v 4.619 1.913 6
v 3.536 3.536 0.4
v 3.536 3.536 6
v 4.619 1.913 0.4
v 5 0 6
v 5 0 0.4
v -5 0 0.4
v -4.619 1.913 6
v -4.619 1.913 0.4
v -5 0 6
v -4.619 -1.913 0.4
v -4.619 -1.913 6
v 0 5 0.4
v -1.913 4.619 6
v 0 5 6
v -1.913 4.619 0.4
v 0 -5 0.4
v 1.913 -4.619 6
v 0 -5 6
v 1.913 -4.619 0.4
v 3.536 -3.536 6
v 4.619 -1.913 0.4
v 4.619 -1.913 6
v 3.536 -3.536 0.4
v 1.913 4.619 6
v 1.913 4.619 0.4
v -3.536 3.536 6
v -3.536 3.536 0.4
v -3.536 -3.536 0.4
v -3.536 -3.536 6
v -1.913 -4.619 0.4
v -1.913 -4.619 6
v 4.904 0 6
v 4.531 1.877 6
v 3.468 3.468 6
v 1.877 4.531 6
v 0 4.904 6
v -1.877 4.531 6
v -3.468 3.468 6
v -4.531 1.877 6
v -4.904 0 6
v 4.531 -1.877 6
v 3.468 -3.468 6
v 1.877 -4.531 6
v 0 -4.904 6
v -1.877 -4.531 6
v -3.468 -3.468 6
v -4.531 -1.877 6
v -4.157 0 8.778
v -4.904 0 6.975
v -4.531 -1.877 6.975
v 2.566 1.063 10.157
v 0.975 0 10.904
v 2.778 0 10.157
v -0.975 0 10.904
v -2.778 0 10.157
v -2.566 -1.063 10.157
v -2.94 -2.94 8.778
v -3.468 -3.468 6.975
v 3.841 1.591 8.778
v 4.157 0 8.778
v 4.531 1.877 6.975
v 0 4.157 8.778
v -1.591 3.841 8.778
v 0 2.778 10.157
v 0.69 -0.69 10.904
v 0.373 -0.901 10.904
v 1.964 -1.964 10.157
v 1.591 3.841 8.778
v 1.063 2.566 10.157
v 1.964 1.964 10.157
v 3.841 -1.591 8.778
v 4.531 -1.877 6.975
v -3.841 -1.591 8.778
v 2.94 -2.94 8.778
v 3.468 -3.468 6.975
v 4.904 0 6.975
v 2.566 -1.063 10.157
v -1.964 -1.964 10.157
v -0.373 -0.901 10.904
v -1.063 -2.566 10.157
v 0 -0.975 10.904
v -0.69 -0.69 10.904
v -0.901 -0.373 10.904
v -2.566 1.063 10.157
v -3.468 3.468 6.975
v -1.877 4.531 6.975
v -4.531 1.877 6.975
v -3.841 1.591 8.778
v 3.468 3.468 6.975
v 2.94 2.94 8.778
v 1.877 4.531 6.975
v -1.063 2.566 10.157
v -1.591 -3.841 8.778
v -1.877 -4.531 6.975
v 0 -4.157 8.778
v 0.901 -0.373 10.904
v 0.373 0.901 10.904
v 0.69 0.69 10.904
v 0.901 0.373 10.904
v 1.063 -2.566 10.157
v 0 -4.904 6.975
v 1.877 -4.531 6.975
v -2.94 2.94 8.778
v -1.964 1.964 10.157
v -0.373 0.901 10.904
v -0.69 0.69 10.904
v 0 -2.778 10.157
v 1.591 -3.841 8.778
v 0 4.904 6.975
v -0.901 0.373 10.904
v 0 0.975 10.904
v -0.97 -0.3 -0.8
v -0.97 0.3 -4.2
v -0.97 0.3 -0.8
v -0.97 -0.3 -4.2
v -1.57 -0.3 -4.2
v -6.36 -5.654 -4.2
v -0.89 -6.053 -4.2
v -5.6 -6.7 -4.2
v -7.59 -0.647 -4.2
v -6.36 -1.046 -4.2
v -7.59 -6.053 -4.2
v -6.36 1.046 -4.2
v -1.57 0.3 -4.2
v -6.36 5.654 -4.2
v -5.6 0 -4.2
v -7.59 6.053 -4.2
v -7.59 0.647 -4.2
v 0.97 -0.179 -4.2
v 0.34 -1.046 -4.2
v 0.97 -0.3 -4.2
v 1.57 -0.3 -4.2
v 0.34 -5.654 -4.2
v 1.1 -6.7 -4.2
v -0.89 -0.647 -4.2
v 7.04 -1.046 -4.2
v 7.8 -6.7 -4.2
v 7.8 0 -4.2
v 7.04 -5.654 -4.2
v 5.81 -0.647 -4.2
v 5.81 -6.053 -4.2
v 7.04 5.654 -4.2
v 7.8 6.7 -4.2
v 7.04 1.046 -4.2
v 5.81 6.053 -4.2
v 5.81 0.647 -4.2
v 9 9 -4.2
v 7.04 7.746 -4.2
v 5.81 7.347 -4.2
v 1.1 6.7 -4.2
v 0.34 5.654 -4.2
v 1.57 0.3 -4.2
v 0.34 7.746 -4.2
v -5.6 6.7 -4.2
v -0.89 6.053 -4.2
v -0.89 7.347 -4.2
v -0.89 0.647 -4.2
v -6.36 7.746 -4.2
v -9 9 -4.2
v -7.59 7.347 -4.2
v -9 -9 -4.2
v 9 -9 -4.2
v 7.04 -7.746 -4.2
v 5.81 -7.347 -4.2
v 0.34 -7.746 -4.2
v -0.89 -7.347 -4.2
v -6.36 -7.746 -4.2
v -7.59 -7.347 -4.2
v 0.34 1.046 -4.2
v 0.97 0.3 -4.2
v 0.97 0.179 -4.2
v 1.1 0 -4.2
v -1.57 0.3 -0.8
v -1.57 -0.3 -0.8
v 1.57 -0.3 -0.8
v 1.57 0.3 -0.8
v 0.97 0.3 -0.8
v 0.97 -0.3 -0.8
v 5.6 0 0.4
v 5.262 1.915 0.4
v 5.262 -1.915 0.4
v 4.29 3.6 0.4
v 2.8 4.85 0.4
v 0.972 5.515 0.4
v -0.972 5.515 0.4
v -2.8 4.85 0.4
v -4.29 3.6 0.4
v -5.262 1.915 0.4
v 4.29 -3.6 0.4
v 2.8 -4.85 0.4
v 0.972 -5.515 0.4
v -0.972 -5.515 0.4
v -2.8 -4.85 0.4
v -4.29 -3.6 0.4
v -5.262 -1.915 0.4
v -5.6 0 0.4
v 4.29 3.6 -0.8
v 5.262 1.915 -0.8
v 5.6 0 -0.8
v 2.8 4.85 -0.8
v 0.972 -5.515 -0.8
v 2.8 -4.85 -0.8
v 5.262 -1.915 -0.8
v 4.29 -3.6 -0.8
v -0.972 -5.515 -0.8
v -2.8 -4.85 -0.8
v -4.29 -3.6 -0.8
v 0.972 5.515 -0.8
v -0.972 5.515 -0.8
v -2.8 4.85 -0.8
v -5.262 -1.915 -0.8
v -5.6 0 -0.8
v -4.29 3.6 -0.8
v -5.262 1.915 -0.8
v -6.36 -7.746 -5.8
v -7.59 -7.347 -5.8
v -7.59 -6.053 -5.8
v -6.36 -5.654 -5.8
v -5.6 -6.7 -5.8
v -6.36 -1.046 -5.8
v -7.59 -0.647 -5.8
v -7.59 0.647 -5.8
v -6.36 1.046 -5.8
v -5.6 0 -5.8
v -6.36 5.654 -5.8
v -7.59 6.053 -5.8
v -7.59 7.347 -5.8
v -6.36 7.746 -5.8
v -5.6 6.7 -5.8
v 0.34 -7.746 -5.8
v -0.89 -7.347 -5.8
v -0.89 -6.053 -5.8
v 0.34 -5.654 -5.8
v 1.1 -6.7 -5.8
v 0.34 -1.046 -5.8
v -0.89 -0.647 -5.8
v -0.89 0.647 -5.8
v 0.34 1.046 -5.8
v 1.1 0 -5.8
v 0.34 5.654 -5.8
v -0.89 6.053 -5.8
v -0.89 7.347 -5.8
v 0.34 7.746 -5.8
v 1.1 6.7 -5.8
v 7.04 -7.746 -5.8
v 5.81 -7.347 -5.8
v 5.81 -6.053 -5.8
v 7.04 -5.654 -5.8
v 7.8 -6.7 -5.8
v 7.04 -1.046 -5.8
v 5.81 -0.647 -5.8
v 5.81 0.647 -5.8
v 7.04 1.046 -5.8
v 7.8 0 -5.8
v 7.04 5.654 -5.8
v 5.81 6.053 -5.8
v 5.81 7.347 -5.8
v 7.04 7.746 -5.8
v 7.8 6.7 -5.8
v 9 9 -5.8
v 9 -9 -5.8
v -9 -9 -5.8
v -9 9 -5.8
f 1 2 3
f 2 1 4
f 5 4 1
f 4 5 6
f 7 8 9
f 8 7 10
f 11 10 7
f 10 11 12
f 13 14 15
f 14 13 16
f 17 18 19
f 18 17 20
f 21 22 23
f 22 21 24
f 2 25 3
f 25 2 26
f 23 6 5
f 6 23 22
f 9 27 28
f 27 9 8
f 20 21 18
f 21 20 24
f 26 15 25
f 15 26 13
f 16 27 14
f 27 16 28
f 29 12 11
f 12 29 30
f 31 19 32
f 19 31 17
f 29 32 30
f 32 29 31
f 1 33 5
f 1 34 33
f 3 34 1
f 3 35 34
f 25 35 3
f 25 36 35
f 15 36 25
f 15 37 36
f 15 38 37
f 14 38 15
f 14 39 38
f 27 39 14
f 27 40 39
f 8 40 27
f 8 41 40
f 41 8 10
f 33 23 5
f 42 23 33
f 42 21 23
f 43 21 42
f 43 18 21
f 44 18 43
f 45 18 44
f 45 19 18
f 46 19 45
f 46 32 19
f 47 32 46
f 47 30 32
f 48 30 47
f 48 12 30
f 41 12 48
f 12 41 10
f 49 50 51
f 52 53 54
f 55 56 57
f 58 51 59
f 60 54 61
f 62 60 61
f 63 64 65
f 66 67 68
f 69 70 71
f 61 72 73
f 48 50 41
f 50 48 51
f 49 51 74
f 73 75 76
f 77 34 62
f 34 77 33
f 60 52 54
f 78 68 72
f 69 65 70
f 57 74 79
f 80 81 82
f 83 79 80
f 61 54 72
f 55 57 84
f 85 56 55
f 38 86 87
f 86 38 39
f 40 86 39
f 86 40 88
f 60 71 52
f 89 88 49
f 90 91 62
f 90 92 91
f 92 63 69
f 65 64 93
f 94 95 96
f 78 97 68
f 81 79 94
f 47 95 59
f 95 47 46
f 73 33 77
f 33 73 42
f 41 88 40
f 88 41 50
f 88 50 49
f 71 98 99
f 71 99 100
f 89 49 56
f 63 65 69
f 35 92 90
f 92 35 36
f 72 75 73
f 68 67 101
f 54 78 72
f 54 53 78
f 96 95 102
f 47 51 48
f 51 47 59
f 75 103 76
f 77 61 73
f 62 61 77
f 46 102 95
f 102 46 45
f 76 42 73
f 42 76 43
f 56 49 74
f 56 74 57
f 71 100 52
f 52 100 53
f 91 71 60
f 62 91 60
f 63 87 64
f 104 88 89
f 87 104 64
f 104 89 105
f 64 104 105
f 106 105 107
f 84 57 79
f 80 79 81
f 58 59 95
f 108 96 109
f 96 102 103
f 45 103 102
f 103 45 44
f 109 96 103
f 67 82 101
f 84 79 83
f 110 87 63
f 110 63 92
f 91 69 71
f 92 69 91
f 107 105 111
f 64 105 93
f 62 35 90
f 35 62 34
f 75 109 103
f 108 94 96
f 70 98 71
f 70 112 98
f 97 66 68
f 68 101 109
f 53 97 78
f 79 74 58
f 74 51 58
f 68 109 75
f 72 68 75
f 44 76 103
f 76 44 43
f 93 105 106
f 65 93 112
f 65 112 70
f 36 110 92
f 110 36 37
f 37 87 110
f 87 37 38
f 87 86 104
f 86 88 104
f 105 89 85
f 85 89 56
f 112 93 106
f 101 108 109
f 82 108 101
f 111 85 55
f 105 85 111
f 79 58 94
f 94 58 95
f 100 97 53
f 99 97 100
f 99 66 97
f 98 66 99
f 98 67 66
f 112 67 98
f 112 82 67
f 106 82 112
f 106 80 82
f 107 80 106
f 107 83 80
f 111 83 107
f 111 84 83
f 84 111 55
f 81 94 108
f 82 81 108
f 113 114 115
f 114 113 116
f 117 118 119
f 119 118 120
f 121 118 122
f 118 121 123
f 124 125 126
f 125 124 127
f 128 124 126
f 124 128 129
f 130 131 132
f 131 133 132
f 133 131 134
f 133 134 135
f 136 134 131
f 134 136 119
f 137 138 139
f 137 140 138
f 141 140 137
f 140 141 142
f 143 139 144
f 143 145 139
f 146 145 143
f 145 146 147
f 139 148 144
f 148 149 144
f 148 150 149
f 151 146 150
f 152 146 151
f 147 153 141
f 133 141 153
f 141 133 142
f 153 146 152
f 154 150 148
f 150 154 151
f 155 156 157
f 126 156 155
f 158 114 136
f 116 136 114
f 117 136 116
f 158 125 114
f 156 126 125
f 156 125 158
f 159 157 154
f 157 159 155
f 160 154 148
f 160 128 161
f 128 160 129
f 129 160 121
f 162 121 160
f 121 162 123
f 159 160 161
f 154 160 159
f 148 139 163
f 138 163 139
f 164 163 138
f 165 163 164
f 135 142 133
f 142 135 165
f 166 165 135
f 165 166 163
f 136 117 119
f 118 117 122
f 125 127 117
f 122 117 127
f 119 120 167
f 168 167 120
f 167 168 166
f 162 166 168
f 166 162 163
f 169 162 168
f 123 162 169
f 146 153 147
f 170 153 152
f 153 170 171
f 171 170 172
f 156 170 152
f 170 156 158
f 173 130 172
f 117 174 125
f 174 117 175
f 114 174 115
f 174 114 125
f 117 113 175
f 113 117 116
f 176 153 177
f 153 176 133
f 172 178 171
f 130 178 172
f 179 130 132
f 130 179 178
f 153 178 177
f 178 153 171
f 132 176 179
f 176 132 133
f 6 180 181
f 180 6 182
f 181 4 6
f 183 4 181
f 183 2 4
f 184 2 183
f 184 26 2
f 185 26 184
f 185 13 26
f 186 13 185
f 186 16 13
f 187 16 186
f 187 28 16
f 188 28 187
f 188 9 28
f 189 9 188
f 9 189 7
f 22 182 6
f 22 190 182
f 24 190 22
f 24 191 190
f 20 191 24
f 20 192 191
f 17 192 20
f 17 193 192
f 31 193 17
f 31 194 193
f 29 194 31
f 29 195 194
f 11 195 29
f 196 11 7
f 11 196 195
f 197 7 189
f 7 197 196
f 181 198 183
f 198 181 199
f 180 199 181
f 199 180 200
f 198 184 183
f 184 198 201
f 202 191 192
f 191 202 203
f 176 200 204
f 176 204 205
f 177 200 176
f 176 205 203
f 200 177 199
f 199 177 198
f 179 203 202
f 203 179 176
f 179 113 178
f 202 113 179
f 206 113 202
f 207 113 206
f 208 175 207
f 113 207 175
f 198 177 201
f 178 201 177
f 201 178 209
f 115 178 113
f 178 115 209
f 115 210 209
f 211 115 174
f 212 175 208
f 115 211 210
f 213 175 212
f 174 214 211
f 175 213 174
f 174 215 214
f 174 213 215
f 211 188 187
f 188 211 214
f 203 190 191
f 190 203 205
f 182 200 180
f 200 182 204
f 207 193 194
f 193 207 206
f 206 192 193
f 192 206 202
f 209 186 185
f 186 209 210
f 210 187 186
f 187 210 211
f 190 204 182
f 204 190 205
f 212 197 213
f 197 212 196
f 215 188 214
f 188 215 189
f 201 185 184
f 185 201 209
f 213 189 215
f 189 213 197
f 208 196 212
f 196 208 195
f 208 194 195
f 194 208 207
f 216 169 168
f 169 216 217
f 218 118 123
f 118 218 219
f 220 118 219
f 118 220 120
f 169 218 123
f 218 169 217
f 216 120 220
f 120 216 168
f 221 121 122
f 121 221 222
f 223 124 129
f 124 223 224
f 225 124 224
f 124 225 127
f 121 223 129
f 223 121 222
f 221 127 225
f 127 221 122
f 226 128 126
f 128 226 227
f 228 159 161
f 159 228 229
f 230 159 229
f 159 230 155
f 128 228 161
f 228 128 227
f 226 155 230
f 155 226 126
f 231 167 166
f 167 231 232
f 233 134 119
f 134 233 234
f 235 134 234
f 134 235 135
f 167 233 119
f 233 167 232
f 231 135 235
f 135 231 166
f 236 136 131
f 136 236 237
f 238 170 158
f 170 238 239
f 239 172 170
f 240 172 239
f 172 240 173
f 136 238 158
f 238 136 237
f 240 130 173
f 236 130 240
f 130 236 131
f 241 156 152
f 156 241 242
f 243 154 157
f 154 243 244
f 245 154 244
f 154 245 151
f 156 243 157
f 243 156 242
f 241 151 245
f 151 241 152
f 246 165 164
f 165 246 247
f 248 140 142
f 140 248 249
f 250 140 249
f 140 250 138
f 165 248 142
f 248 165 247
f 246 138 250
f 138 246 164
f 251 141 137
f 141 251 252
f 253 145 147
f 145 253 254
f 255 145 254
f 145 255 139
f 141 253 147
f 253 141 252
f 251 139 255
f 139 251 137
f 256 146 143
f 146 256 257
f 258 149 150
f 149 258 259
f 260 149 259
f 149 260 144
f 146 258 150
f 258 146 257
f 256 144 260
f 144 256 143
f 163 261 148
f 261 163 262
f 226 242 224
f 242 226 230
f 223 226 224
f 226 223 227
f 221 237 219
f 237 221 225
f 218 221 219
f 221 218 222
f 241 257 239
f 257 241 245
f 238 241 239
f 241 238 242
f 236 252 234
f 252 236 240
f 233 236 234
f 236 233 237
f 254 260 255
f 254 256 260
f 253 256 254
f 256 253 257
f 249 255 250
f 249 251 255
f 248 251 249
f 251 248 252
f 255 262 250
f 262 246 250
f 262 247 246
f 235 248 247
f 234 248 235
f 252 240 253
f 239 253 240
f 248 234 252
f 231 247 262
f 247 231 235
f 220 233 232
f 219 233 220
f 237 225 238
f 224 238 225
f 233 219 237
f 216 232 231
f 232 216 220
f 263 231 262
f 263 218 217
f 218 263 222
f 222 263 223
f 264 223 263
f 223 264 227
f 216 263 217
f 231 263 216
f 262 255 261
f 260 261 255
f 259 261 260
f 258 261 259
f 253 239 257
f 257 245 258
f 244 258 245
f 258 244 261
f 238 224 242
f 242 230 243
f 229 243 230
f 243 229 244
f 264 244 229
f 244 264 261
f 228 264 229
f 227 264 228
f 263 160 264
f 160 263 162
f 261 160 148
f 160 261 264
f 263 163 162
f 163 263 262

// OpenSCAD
// Parameters
led_diameter_mm = 10; //[5:20:0.5]
body_height_mm = 11; //[6:22:0.5]
through_hole = 1; //[0:1:1]
lead_count = 2; //[2:2:1]
lead_length_mm = 5; //[2.5:10:0.5]
right_angle = 0; //[0:10:1]
lead_thickness_mm = 0.6; //[0.3:1.2:0.1]
lead_pitch_mm = 2.54; //[1.27:5.08:0.01]
rim_thickness_mm = 1.2; //[0.6:2.4:0.1]
rim_diameter_mm = 11.2; //[10.2:22.4:0.1]
lens_round_radius_mm = 5; //[2.5:10:0.5]
overlap_mm = 0.8; //[0.2:2:0.1]
grill_plate_w_mm = 18; //[9:36:0.5]
grill_plate_h_mm = 18; //[9:36:0.5]
grill_plate_t_mm = 1.6; //[0.8:3.2:0.1]
grill_hole_d_mm = 2.2; //[1:4.4:0.1]
grill_gap_mm = 1.2; //[0.6:2.4:0.1]
grill_radius_limit_mm = 1000; //[50:2000:10]

// LED Module
module led() {
  color("red") {
    // LED Body
    union() {
      translate([0, 0, (body_height_mm - lens_round_radius_mm) / 2])
        cylinder(r=led_diameter_mm/2, h=body_height_mm - lens_round_radius_mm, center=true);
      translate([0, 0, body_height_mm - lens_round_radius_mm])
        sphere(r=lens_round_radius_mm, center=true);
    }
    // Rim Flange
    translate([0, 0, rim_thickness_mm/2 - overlap_mm])
      cylinder(r=rim_diameter_mm/2, h=rim_thickness_mm, center=true);
    // Leads
    union() {
      translate([-lead_pitch_mm/2, 0, -lead_length_mm/2 + overlap_mm])
        cube([lead_thickness_mm, lead_thickness_mm, lead_length_mm], center=true);
      translate([lead_pitch_mm/2, 0, -lead_length_mm/2 + overlap_mm])
        cube([lead_thickness_mm, lead_thickness_mm, lead_length_mm], center=true);
    }
  }
}

// Grill Hole Positions Module
module grill_hole_positions() {
  color("Silver") {
    for (x = [-1, 0, 1])
      for (y = [-1, 0, 1])
        translate([x * (grill_plate_w_mm/2 - (grill_hole_d_mm/2 + grill_gap_mm)),
                   y * (grill_plate_h_mm/2 - (grill_hole_d_mm/2 + grill_gap_mm)),
                   -lead_length_mm - grill_plate_t_mm/2 + overlap_mm])
          cylinder(r=grill_hole_d_mm/2, h=grill_plate_t_mm + 2*overlap_mm, center=true);
  }
}

// Assembly Module
module assembly() {
  led();
  if (through_hole) {
    difference() {
      translate([0, 0, -lead_length_mm - grill_plate_t_mm/2 + overlap_mm])
        cube([grill_plate_w_mm, grill_plate_h_mm, grill_plate_t_mm], center=true);
      grill_hole_positions();
    }
  }
}

assembly();
